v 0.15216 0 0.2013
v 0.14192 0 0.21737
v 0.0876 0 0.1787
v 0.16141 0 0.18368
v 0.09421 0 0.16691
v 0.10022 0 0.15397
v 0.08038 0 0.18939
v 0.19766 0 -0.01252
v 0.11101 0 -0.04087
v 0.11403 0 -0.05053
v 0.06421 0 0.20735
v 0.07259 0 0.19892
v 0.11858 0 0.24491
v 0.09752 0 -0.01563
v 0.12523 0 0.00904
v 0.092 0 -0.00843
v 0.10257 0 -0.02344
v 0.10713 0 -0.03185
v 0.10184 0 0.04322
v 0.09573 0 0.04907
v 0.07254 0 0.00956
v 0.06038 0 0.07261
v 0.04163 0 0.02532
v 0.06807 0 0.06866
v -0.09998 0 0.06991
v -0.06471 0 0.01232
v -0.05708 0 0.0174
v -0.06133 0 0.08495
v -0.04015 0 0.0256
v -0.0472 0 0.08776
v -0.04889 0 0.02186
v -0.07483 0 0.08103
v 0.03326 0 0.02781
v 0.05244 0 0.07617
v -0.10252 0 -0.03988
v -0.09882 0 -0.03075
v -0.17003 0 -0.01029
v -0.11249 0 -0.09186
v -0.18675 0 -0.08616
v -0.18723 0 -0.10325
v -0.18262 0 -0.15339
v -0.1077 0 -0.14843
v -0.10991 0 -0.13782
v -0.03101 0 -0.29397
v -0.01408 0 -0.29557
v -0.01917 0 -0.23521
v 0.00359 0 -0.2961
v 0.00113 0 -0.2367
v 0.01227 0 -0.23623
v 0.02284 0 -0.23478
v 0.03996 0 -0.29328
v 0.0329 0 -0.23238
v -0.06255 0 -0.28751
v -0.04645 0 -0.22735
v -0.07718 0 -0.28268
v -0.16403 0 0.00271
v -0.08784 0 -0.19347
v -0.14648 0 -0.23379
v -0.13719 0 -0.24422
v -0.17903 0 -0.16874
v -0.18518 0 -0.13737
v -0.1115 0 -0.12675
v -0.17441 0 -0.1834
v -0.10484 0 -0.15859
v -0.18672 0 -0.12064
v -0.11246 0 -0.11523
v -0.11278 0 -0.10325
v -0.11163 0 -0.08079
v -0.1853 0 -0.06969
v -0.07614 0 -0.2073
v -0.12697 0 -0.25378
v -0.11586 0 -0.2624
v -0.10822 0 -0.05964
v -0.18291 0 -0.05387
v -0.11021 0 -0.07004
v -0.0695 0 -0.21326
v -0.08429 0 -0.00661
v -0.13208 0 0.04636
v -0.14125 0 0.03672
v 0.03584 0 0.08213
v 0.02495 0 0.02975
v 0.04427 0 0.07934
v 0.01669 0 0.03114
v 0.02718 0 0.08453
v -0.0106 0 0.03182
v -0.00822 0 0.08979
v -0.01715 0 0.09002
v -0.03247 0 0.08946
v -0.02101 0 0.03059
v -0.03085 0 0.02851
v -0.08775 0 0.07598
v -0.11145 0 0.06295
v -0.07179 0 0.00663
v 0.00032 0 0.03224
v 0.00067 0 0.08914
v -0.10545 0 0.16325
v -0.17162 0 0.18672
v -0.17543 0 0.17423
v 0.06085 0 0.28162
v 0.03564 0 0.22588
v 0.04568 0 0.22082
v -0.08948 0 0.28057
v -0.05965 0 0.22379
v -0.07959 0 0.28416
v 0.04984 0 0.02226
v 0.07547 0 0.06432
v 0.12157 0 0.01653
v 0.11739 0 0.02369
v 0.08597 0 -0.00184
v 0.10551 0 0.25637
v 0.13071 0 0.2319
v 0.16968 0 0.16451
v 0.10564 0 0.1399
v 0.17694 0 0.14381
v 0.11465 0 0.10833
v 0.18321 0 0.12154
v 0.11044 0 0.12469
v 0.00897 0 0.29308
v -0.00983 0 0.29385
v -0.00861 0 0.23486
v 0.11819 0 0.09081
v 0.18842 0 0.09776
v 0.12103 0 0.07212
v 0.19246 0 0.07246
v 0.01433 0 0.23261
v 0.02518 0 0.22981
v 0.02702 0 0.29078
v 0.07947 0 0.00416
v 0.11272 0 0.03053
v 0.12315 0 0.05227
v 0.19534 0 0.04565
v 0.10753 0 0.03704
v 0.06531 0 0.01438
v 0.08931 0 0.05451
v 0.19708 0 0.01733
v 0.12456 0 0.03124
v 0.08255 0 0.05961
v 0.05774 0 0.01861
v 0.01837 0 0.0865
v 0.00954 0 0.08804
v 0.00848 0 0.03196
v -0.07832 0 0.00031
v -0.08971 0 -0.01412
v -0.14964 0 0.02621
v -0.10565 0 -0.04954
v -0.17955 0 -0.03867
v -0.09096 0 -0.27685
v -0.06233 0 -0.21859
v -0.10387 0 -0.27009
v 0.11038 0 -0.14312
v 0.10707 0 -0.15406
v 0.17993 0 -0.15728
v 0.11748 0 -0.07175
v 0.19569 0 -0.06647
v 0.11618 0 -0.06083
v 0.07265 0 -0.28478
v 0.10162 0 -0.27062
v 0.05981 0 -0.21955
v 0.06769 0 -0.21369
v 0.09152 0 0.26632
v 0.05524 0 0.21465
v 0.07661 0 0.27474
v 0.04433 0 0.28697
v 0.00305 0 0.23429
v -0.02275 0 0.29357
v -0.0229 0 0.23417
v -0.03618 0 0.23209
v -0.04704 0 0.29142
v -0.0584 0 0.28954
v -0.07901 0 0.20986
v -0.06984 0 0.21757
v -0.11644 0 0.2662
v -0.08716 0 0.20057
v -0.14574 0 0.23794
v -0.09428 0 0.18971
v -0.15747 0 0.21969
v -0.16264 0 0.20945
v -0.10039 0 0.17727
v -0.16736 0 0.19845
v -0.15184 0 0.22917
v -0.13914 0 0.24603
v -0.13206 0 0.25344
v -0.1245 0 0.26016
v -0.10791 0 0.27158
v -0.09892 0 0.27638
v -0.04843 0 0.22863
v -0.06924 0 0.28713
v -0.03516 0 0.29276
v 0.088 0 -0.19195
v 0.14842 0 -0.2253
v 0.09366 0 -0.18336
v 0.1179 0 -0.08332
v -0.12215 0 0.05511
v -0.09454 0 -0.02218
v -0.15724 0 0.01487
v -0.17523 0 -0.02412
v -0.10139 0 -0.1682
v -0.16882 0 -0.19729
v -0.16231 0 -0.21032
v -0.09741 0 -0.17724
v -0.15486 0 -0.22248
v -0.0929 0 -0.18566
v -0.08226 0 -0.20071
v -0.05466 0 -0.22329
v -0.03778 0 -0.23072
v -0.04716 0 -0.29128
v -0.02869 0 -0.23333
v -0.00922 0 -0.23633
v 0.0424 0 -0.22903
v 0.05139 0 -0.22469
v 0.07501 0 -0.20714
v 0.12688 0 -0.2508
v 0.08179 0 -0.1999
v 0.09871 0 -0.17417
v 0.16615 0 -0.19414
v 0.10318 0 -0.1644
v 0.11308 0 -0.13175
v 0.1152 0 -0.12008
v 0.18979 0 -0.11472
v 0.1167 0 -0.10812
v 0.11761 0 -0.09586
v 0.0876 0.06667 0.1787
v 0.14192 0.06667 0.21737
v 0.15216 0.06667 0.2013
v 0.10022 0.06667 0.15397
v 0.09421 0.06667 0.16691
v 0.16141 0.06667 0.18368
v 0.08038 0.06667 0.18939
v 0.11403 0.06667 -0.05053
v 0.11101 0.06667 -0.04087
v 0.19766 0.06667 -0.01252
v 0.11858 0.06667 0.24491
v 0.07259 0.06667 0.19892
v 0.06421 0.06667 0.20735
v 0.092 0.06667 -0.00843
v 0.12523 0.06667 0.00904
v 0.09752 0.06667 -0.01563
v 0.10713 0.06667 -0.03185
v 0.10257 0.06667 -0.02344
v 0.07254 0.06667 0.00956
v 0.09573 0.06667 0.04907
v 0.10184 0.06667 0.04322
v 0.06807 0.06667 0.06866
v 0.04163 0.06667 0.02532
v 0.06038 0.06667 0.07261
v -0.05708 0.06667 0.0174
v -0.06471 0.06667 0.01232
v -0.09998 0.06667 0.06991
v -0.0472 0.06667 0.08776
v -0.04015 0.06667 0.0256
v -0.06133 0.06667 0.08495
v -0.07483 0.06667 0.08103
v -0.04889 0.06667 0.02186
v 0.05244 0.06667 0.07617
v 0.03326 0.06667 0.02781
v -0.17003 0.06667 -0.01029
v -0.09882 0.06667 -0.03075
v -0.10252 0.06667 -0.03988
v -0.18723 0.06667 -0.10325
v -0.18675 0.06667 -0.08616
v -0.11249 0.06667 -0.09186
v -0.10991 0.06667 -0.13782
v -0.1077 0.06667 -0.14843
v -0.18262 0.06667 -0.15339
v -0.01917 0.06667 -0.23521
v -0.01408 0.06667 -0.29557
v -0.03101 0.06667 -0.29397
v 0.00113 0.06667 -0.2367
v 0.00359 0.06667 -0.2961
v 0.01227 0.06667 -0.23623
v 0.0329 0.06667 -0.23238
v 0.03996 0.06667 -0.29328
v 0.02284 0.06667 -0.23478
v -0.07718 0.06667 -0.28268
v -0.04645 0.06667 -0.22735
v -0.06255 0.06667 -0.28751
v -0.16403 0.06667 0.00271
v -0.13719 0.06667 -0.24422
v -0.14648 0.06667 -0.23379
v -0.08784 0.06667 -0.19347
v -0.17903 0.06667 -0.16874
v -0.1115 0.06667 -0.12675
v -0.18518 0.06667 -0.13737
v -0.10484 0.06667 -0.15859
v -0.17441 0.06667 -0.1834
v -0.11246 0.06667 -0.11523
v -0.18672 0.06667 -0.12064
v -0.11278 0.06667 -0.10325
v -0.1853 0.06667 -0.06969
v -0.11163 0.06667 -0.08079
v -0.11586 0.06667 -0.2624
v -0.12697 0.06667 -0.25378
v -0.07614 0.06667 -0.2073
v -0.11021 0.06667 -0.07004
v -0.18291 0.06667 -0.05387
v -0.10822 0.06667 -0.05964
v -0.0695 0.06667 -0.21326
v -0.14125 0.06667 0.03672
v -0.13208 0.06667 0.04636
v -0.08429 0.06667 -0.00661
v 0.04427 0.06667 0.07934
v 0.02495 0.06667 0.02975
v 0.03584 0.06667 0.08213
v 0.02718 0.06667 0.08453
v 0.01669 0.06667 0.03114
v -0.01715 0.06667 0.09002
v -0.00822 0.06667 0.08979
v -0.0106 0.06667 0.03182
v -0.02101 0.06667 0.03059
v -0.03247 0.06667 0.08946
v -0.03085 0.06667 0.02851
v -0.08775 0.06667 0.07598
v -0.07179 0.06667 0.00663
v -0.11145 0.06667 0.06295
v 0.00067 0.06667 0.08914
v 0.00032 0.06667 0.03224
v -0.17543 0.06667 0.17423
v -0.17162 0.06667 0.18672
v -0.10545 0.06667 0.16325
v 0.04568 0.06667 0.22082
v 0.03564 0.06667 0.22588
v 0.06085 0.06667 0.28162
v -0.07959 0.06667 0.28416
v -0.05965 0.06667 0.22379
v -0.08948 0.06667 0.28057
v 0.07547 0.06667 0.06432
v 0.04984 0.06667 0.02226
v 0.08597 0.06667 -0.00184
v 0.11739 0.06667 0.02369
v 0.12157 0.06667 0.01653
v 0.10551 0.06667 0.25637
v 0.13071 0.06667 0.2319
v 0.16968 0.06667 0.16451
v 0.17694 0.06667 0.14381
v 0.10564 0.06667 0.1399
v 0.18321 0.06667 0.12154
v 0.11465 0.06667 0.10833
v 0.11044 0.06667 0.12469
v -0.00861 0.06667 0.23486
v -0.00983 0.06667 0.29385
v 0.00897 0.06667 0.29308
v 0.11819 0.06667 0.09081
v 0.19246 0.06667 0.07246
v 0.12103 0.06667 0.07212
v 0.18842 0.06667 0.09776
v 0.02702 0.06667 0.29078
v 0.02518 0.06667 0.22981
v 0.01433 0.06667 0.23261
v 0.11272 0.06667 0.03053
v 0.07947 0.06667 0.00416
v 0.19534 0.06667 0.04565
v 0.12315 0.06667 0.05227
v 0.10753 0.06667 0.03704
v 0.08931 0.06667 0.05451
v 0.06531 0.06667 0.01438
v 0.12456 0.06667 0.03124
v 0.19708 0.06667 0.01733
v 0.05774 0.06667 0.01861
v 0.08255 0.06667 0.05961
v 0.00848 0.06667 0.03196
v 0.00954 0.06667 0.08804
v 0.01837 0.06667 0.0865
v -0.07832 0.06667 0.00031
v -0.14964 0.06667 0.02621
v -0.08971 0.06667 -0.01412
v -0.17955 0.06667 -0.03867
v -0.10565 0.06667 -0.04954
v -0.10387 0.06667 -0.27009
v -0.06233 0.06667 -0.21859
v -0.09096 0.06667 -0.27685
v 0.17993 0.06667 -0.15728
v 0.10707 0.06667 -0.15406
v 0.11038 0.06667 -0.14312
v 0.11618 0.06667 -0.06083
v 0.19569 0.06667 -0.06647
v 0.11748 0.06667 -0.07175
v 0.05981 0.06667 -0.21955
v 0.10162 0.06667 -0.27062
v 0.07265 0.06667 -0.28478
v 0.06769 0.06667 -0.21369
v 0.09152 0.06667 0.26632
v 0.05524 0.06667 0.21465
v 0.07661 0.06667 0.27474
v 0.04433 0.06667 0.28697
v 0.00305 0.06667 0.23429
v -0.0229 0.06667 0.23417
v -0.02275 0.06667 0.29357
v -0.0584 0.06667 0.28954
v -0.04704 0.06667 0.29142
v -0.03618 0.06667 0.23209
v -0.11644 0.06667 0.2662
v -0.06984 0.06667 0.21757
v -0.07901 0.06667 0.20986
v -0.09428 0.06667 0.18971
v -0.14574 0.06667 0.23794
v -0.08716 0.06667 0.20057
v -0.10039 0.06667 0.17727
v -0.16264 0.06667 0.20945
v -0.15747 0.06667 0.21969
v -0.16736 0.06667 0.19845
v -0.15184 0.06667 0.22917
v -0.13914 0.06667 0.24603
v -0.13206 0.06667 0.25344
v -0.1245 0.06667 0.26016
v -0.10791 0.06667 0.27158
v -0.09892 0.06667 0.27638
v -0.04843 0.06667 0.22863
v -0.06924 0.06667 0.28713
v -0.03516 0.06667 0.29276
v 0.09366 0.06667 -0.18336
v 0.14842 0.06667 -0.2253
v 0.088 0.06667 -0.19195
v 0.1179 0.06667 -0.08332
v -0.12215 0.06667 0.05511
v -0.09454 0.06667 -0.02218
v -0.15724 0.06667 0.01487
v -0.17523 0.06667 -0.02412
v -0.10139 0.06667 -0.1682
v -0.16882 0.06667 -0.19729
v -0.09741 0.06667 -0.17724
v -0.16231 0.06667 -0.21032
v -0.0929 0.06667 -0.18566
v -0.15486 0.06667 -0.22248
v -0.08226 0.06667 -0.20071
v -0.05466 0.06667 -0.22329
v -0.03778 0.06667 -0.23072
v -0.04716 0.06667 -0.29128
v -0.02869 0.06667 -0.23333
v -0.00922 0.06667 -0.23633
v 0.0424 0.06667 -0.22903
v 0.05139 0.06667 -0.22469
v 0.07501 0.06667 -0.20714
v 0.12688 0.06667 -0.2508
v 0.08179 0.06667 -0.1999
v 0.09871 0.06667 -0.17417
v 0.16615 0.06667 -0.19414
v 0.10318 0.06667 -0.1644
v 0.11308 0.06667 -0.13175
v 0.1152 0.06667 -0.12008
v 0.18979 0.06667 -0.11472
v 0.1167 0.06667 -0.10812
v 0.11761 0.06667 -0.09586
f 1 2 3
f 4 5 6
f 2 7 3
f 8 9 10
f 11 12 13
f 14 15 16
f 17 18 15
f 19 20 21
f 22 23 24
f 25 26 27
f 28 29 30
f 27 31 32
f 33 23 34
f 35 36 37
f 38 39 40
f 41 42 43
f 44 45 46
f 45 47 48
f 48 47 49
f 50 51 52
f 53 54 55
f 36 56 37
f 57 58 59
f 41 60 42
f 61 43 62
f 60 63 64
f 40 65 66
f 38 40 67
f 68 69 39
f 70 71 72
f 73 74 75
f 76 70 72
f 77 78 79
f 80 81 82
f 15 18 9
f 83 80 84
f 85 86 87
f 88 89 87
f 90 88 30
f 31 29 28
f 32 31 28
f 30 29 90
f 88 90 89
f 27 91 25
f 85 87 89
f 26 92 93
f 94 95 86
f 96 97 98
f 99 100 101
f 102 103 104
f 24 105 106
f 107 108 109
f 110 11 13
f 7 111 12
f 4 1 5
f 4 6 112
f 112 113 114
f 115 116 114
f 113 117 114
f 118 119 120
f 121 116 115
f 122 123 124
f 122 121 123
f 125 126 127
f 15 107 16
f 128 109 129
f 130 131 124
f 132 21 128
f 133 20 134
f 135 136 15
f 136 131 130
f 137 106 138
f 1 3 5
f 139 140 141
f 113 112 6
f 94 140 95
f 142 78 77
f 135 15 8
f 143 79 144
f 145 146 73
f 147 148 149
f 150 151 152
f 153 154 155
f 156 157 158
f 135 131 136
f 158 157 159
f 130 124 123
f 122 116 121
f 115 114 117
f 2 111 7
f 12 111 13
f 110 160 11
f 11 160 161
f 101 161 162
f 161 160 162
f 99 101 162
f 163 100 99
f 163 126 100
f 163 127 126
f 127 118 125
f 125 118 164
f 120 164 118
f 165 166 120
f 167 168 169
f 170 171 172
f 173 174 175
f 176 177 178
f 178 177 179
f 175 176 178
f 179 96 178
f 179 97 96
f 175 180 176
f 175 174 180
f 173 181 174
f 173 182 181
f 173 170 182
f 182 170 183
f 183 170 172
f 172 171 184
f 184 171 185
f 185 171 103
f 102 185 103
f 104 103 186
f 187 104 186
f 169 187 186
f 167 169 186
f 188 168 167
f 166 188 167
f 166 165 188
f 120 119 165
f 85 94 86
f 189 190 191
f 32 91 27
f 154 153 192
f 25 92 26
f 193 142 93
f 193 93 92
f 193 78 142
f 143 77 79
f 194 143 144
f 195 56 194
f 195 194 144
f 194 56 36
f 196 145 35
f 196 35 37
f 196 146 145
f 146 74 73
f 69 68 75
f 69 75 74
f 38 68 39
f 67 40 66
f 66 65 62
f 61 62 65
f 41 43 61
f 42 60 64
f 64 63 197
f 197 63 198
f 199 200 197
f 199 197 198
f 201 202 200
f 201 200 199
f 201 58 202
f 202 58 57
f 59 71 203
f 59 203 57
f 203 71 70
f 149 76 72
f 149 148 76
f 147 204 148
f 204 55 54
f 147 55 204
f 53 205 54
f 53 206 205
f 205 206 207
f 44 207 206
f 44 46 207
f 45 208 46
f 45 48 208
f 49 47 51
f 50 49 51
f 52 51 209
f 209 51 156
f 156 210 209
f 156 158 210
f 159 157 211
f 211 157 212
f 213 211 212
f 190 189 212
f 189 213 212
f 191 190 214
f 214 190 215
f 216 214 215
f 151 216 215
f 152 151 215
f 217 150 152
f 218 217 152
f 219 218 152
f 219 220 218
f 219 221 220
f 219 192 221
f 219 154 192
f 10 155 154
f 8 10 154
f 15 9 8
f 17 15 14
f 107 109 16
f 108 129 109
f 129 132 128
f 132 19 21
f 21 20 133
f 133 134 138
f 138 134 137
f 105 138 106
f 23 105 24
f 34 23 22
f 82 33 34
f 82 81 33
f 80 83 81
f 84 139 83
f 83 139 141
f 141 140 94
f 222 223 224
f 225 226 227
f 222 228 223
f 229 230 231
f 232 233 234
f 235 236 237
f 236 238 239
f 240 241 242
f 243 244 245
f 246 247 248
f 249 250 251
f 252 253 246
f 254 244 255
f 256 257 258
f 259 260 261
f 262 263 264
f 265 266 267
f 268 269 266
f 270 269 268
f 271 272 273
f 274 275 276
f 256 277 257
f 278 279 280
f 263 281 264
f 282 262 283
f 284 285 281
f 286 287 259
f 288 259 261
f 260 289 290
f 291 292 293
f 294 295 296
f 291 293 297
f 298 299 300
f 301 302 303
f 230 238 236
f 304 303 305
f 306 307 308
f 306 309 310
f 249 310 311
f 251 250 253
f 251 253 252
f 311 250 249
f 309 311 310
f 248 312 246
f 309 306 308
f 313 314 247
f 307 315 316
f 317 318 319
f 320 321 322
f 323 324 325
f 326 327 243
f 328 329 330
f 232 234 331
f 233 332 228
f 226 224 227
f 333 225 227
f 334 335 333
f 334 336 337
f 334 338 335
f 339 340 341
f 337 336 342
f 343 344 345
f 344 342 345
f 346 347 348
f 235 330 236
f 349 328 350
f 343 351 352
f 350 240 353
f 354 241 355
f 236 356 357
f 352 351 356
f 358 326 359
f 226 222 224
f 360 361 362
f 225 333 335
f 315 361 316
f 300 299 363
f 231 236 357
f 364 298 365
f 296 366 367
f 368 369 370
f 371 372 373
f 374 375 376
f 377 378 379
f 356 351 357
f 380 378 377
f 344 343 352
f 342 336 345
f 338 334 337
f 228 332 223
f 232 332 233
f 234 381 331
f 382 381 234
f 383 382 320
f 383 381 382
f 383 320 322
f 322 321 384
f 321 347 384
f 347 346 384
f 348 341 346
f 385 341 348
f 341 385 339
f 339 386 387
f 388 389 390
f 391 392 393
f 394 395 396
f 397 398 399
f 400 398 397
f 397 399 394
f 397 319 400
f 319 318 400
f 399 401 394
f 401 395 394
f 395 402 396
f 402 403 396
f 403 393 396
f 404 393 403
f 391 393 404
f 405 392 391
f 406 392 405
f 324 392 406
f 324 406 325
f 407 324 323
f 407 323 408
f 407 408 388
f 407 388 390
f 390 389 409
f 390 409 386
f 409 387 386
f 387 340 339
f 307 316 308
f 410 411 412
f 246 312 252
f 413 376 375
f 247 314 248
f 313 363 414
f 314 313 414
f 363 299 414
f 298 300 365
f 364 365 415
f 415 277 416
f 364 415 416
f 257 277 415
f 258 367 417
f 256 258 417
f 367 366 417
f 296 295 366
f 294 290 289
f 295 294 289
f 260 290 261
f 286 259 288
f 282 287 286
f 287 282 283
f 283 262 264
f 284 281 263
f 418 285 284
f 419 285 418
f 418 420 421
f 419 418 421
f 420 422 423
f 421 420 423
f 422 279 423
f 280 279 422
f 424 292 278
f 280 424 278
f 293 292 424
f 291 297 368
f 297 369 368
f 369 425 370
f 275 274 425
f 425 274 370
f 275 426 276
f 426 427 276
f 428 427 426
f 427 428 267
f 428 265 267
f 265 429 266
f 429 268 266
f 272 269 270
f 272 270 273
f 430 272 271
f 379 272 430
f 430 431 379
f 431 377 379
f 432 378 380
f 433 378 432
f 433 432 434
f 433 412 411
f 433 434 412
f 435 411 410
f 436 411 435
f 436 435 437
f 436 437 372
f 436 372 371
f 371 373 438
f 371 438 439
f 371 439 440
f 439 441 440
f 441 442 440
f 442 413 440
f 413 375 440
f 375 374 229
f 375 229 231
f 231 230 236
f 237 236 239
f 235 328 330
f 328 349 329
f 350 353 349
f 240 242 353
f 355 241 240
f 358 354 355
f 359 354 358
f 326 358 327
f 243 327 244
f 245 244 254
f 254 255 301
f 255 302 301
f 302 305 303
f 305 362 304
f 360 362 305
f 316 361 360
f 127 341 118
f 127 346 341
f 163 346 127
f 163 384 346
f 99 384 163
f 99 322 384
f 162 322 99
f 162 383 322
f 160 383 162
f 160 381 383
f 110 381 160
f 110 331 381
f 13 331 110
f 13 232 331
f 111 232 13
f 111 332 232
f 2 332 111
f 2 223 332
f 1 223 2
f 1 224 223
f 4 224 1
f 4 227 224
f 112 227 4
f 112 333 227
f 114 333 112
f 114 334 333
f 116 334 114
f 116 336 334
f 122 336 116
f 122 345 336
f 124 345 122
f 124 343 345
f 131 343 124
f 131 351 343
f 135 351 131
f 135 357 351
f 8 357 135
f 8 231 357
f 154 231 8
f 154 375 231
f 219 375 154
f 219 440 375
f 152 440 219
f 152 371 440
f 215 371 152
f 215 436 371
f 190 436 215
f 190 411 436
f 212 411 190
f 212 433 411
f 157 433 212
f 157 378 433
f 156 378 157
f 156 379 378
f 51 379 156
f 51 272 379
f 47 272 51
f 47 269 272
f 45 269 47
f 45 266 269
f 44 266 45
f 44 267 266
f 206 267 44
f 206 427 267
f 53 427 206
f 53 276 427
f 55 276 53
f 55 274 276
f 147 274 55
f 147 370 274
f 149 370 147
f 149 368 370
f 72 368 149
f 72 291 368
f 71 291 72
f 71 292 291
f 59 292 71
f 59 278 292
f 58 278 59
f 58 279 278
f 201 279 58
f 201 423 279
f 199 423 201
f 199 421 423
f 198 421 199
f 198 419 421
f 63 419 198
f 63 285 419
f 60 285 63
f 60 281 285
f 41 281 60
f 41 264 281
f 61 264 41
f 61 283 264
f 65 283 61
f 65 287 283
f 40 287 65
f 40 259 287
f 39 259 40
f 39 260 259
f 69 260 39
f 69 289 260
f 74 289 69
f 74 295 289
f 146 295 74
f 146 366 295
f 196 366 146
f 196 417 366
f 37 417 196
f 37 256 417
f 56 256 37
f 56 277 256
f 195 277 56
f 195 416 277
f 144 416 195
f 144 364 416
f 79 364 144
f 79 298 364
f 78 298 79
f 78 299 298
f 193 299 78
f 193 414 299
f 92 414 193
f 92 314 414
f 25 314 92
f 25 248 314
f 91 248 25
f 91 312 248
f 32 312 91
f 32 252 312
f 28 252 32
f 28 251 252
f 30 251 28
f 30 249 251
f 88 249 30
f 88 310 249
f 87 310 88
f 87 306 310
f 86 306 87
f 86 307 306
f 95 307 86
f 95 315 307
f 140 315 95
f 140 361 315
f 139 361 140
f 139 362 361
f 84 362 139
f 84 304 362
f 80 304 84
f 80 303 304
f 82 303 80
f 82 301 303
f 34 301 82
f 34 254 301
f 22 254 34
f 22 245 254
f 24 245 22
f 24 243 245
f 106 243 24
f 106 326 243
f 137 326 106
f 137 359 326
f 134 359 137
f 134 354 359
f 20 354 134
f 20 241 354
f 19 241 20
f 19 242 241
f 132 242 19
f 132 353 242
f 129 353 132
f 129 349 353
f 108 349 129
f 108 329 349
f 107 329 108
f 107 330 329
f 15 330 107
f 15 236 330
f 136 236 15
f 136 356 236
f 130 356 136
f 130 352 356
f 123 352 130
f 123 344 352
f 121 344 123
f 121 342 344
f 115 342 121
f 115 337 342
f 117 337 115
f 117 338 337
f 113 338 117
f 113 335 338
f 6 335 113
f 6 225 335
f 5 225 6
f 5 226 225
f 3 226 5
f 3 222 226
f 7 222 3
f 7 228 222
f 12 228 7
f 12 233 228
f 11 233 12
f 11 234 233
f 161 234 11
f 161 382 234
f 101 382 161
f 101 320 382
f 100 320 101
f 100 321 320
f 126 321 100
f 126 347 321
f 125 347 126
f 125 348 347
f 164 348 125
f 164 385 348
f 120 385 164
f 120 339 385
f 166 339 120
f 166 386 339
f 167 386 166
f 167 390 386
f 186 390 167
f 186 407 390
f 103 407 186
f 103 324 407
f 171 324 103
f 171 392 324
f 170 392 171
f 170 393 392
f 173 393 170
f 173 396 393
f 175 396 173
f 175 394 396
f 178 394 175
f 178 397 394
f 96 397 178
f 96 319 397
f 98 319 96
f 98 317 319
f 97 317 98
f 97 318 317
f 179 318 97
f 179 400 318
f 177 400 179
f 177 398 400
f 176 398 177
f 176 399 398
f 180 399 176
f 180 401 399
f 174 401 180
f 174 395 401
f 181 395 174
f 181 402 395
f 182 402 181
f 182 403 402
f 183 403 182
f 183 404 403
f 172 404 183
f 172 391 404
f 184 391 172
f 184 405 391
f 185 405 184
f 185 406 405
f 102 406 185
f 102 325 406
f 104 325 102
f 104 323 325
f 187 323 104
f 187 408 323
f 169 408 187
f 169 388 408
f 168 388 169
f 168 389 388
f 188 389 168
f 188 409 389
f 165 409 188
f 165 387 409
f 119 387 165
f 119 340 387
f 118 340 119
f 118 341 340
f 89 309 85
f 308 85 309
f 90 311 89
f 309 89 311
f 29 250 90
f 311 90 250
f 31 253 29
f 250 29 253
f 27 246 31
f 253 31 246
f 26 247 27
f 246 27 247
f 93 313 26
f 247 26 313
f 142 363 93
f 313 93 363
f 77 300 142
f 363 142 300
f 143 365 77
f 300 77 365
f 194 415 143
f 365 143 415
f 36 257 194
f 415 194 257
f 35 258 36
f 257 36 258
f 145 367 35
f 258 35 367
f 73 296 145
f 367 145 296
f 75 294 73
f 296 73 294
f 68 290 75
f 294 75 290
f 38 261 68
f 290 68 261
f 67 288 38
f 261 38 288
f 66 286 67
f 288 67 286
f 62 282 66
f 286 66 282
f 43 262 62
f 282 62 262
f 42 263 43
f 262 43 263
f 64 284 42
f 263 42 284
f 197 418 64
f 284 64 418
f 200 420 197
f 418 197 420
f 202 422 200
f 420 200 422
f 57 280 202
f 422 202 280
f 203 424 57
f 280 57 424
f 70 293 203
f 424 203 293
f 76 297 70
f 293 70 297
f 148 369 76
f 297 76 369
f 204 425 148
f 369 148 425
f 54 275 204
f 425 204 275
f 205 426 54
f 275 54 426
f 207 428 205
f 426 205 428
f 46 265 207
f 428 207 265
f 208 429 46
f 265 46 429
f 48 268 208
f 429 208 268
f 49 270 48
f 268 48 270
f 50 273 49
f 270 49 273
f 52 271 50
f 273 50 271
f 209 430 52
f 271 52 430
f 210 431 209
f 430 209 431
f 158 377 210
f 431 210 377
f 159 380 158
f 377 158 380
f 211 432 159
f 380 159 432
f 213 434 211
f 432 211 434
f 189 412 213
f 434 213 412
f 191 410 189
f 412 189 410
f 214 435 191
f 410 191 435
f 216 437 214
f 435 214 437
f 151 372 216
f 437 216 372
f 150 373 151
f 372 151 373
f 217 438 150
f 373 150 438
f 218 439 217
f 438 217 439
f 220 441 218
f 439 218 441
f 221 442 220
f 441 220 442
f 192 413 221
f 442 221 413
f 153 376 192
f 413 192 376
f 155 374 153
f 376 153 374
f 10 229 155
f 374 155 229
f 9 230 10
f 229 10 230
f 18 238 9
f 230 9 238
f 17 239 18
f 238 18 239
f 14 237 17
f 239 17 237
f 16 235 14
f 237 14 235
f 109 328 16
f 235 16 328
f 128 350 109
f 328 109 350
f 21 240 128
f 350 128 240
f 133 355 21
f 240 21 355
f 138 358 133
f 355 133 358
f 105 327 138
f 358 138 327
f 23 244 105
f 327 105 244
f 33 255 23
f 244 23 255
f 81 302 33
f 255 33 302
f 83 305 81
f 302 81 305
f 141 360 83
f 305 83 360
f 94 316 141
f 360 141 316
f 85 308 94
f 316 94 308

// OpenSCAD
$fa = 1;
$fs = 0.1;
mag = 1 / 15;
thickness = mag * 1;
height = mag * 15;
width = mag * 10;
border = mag * 1;
translate([0,0,height/3.5])
rotate([-90,0,0])
  linear_extrude(height = thickness)
  text("9", size = 0.6, halign = "center");
